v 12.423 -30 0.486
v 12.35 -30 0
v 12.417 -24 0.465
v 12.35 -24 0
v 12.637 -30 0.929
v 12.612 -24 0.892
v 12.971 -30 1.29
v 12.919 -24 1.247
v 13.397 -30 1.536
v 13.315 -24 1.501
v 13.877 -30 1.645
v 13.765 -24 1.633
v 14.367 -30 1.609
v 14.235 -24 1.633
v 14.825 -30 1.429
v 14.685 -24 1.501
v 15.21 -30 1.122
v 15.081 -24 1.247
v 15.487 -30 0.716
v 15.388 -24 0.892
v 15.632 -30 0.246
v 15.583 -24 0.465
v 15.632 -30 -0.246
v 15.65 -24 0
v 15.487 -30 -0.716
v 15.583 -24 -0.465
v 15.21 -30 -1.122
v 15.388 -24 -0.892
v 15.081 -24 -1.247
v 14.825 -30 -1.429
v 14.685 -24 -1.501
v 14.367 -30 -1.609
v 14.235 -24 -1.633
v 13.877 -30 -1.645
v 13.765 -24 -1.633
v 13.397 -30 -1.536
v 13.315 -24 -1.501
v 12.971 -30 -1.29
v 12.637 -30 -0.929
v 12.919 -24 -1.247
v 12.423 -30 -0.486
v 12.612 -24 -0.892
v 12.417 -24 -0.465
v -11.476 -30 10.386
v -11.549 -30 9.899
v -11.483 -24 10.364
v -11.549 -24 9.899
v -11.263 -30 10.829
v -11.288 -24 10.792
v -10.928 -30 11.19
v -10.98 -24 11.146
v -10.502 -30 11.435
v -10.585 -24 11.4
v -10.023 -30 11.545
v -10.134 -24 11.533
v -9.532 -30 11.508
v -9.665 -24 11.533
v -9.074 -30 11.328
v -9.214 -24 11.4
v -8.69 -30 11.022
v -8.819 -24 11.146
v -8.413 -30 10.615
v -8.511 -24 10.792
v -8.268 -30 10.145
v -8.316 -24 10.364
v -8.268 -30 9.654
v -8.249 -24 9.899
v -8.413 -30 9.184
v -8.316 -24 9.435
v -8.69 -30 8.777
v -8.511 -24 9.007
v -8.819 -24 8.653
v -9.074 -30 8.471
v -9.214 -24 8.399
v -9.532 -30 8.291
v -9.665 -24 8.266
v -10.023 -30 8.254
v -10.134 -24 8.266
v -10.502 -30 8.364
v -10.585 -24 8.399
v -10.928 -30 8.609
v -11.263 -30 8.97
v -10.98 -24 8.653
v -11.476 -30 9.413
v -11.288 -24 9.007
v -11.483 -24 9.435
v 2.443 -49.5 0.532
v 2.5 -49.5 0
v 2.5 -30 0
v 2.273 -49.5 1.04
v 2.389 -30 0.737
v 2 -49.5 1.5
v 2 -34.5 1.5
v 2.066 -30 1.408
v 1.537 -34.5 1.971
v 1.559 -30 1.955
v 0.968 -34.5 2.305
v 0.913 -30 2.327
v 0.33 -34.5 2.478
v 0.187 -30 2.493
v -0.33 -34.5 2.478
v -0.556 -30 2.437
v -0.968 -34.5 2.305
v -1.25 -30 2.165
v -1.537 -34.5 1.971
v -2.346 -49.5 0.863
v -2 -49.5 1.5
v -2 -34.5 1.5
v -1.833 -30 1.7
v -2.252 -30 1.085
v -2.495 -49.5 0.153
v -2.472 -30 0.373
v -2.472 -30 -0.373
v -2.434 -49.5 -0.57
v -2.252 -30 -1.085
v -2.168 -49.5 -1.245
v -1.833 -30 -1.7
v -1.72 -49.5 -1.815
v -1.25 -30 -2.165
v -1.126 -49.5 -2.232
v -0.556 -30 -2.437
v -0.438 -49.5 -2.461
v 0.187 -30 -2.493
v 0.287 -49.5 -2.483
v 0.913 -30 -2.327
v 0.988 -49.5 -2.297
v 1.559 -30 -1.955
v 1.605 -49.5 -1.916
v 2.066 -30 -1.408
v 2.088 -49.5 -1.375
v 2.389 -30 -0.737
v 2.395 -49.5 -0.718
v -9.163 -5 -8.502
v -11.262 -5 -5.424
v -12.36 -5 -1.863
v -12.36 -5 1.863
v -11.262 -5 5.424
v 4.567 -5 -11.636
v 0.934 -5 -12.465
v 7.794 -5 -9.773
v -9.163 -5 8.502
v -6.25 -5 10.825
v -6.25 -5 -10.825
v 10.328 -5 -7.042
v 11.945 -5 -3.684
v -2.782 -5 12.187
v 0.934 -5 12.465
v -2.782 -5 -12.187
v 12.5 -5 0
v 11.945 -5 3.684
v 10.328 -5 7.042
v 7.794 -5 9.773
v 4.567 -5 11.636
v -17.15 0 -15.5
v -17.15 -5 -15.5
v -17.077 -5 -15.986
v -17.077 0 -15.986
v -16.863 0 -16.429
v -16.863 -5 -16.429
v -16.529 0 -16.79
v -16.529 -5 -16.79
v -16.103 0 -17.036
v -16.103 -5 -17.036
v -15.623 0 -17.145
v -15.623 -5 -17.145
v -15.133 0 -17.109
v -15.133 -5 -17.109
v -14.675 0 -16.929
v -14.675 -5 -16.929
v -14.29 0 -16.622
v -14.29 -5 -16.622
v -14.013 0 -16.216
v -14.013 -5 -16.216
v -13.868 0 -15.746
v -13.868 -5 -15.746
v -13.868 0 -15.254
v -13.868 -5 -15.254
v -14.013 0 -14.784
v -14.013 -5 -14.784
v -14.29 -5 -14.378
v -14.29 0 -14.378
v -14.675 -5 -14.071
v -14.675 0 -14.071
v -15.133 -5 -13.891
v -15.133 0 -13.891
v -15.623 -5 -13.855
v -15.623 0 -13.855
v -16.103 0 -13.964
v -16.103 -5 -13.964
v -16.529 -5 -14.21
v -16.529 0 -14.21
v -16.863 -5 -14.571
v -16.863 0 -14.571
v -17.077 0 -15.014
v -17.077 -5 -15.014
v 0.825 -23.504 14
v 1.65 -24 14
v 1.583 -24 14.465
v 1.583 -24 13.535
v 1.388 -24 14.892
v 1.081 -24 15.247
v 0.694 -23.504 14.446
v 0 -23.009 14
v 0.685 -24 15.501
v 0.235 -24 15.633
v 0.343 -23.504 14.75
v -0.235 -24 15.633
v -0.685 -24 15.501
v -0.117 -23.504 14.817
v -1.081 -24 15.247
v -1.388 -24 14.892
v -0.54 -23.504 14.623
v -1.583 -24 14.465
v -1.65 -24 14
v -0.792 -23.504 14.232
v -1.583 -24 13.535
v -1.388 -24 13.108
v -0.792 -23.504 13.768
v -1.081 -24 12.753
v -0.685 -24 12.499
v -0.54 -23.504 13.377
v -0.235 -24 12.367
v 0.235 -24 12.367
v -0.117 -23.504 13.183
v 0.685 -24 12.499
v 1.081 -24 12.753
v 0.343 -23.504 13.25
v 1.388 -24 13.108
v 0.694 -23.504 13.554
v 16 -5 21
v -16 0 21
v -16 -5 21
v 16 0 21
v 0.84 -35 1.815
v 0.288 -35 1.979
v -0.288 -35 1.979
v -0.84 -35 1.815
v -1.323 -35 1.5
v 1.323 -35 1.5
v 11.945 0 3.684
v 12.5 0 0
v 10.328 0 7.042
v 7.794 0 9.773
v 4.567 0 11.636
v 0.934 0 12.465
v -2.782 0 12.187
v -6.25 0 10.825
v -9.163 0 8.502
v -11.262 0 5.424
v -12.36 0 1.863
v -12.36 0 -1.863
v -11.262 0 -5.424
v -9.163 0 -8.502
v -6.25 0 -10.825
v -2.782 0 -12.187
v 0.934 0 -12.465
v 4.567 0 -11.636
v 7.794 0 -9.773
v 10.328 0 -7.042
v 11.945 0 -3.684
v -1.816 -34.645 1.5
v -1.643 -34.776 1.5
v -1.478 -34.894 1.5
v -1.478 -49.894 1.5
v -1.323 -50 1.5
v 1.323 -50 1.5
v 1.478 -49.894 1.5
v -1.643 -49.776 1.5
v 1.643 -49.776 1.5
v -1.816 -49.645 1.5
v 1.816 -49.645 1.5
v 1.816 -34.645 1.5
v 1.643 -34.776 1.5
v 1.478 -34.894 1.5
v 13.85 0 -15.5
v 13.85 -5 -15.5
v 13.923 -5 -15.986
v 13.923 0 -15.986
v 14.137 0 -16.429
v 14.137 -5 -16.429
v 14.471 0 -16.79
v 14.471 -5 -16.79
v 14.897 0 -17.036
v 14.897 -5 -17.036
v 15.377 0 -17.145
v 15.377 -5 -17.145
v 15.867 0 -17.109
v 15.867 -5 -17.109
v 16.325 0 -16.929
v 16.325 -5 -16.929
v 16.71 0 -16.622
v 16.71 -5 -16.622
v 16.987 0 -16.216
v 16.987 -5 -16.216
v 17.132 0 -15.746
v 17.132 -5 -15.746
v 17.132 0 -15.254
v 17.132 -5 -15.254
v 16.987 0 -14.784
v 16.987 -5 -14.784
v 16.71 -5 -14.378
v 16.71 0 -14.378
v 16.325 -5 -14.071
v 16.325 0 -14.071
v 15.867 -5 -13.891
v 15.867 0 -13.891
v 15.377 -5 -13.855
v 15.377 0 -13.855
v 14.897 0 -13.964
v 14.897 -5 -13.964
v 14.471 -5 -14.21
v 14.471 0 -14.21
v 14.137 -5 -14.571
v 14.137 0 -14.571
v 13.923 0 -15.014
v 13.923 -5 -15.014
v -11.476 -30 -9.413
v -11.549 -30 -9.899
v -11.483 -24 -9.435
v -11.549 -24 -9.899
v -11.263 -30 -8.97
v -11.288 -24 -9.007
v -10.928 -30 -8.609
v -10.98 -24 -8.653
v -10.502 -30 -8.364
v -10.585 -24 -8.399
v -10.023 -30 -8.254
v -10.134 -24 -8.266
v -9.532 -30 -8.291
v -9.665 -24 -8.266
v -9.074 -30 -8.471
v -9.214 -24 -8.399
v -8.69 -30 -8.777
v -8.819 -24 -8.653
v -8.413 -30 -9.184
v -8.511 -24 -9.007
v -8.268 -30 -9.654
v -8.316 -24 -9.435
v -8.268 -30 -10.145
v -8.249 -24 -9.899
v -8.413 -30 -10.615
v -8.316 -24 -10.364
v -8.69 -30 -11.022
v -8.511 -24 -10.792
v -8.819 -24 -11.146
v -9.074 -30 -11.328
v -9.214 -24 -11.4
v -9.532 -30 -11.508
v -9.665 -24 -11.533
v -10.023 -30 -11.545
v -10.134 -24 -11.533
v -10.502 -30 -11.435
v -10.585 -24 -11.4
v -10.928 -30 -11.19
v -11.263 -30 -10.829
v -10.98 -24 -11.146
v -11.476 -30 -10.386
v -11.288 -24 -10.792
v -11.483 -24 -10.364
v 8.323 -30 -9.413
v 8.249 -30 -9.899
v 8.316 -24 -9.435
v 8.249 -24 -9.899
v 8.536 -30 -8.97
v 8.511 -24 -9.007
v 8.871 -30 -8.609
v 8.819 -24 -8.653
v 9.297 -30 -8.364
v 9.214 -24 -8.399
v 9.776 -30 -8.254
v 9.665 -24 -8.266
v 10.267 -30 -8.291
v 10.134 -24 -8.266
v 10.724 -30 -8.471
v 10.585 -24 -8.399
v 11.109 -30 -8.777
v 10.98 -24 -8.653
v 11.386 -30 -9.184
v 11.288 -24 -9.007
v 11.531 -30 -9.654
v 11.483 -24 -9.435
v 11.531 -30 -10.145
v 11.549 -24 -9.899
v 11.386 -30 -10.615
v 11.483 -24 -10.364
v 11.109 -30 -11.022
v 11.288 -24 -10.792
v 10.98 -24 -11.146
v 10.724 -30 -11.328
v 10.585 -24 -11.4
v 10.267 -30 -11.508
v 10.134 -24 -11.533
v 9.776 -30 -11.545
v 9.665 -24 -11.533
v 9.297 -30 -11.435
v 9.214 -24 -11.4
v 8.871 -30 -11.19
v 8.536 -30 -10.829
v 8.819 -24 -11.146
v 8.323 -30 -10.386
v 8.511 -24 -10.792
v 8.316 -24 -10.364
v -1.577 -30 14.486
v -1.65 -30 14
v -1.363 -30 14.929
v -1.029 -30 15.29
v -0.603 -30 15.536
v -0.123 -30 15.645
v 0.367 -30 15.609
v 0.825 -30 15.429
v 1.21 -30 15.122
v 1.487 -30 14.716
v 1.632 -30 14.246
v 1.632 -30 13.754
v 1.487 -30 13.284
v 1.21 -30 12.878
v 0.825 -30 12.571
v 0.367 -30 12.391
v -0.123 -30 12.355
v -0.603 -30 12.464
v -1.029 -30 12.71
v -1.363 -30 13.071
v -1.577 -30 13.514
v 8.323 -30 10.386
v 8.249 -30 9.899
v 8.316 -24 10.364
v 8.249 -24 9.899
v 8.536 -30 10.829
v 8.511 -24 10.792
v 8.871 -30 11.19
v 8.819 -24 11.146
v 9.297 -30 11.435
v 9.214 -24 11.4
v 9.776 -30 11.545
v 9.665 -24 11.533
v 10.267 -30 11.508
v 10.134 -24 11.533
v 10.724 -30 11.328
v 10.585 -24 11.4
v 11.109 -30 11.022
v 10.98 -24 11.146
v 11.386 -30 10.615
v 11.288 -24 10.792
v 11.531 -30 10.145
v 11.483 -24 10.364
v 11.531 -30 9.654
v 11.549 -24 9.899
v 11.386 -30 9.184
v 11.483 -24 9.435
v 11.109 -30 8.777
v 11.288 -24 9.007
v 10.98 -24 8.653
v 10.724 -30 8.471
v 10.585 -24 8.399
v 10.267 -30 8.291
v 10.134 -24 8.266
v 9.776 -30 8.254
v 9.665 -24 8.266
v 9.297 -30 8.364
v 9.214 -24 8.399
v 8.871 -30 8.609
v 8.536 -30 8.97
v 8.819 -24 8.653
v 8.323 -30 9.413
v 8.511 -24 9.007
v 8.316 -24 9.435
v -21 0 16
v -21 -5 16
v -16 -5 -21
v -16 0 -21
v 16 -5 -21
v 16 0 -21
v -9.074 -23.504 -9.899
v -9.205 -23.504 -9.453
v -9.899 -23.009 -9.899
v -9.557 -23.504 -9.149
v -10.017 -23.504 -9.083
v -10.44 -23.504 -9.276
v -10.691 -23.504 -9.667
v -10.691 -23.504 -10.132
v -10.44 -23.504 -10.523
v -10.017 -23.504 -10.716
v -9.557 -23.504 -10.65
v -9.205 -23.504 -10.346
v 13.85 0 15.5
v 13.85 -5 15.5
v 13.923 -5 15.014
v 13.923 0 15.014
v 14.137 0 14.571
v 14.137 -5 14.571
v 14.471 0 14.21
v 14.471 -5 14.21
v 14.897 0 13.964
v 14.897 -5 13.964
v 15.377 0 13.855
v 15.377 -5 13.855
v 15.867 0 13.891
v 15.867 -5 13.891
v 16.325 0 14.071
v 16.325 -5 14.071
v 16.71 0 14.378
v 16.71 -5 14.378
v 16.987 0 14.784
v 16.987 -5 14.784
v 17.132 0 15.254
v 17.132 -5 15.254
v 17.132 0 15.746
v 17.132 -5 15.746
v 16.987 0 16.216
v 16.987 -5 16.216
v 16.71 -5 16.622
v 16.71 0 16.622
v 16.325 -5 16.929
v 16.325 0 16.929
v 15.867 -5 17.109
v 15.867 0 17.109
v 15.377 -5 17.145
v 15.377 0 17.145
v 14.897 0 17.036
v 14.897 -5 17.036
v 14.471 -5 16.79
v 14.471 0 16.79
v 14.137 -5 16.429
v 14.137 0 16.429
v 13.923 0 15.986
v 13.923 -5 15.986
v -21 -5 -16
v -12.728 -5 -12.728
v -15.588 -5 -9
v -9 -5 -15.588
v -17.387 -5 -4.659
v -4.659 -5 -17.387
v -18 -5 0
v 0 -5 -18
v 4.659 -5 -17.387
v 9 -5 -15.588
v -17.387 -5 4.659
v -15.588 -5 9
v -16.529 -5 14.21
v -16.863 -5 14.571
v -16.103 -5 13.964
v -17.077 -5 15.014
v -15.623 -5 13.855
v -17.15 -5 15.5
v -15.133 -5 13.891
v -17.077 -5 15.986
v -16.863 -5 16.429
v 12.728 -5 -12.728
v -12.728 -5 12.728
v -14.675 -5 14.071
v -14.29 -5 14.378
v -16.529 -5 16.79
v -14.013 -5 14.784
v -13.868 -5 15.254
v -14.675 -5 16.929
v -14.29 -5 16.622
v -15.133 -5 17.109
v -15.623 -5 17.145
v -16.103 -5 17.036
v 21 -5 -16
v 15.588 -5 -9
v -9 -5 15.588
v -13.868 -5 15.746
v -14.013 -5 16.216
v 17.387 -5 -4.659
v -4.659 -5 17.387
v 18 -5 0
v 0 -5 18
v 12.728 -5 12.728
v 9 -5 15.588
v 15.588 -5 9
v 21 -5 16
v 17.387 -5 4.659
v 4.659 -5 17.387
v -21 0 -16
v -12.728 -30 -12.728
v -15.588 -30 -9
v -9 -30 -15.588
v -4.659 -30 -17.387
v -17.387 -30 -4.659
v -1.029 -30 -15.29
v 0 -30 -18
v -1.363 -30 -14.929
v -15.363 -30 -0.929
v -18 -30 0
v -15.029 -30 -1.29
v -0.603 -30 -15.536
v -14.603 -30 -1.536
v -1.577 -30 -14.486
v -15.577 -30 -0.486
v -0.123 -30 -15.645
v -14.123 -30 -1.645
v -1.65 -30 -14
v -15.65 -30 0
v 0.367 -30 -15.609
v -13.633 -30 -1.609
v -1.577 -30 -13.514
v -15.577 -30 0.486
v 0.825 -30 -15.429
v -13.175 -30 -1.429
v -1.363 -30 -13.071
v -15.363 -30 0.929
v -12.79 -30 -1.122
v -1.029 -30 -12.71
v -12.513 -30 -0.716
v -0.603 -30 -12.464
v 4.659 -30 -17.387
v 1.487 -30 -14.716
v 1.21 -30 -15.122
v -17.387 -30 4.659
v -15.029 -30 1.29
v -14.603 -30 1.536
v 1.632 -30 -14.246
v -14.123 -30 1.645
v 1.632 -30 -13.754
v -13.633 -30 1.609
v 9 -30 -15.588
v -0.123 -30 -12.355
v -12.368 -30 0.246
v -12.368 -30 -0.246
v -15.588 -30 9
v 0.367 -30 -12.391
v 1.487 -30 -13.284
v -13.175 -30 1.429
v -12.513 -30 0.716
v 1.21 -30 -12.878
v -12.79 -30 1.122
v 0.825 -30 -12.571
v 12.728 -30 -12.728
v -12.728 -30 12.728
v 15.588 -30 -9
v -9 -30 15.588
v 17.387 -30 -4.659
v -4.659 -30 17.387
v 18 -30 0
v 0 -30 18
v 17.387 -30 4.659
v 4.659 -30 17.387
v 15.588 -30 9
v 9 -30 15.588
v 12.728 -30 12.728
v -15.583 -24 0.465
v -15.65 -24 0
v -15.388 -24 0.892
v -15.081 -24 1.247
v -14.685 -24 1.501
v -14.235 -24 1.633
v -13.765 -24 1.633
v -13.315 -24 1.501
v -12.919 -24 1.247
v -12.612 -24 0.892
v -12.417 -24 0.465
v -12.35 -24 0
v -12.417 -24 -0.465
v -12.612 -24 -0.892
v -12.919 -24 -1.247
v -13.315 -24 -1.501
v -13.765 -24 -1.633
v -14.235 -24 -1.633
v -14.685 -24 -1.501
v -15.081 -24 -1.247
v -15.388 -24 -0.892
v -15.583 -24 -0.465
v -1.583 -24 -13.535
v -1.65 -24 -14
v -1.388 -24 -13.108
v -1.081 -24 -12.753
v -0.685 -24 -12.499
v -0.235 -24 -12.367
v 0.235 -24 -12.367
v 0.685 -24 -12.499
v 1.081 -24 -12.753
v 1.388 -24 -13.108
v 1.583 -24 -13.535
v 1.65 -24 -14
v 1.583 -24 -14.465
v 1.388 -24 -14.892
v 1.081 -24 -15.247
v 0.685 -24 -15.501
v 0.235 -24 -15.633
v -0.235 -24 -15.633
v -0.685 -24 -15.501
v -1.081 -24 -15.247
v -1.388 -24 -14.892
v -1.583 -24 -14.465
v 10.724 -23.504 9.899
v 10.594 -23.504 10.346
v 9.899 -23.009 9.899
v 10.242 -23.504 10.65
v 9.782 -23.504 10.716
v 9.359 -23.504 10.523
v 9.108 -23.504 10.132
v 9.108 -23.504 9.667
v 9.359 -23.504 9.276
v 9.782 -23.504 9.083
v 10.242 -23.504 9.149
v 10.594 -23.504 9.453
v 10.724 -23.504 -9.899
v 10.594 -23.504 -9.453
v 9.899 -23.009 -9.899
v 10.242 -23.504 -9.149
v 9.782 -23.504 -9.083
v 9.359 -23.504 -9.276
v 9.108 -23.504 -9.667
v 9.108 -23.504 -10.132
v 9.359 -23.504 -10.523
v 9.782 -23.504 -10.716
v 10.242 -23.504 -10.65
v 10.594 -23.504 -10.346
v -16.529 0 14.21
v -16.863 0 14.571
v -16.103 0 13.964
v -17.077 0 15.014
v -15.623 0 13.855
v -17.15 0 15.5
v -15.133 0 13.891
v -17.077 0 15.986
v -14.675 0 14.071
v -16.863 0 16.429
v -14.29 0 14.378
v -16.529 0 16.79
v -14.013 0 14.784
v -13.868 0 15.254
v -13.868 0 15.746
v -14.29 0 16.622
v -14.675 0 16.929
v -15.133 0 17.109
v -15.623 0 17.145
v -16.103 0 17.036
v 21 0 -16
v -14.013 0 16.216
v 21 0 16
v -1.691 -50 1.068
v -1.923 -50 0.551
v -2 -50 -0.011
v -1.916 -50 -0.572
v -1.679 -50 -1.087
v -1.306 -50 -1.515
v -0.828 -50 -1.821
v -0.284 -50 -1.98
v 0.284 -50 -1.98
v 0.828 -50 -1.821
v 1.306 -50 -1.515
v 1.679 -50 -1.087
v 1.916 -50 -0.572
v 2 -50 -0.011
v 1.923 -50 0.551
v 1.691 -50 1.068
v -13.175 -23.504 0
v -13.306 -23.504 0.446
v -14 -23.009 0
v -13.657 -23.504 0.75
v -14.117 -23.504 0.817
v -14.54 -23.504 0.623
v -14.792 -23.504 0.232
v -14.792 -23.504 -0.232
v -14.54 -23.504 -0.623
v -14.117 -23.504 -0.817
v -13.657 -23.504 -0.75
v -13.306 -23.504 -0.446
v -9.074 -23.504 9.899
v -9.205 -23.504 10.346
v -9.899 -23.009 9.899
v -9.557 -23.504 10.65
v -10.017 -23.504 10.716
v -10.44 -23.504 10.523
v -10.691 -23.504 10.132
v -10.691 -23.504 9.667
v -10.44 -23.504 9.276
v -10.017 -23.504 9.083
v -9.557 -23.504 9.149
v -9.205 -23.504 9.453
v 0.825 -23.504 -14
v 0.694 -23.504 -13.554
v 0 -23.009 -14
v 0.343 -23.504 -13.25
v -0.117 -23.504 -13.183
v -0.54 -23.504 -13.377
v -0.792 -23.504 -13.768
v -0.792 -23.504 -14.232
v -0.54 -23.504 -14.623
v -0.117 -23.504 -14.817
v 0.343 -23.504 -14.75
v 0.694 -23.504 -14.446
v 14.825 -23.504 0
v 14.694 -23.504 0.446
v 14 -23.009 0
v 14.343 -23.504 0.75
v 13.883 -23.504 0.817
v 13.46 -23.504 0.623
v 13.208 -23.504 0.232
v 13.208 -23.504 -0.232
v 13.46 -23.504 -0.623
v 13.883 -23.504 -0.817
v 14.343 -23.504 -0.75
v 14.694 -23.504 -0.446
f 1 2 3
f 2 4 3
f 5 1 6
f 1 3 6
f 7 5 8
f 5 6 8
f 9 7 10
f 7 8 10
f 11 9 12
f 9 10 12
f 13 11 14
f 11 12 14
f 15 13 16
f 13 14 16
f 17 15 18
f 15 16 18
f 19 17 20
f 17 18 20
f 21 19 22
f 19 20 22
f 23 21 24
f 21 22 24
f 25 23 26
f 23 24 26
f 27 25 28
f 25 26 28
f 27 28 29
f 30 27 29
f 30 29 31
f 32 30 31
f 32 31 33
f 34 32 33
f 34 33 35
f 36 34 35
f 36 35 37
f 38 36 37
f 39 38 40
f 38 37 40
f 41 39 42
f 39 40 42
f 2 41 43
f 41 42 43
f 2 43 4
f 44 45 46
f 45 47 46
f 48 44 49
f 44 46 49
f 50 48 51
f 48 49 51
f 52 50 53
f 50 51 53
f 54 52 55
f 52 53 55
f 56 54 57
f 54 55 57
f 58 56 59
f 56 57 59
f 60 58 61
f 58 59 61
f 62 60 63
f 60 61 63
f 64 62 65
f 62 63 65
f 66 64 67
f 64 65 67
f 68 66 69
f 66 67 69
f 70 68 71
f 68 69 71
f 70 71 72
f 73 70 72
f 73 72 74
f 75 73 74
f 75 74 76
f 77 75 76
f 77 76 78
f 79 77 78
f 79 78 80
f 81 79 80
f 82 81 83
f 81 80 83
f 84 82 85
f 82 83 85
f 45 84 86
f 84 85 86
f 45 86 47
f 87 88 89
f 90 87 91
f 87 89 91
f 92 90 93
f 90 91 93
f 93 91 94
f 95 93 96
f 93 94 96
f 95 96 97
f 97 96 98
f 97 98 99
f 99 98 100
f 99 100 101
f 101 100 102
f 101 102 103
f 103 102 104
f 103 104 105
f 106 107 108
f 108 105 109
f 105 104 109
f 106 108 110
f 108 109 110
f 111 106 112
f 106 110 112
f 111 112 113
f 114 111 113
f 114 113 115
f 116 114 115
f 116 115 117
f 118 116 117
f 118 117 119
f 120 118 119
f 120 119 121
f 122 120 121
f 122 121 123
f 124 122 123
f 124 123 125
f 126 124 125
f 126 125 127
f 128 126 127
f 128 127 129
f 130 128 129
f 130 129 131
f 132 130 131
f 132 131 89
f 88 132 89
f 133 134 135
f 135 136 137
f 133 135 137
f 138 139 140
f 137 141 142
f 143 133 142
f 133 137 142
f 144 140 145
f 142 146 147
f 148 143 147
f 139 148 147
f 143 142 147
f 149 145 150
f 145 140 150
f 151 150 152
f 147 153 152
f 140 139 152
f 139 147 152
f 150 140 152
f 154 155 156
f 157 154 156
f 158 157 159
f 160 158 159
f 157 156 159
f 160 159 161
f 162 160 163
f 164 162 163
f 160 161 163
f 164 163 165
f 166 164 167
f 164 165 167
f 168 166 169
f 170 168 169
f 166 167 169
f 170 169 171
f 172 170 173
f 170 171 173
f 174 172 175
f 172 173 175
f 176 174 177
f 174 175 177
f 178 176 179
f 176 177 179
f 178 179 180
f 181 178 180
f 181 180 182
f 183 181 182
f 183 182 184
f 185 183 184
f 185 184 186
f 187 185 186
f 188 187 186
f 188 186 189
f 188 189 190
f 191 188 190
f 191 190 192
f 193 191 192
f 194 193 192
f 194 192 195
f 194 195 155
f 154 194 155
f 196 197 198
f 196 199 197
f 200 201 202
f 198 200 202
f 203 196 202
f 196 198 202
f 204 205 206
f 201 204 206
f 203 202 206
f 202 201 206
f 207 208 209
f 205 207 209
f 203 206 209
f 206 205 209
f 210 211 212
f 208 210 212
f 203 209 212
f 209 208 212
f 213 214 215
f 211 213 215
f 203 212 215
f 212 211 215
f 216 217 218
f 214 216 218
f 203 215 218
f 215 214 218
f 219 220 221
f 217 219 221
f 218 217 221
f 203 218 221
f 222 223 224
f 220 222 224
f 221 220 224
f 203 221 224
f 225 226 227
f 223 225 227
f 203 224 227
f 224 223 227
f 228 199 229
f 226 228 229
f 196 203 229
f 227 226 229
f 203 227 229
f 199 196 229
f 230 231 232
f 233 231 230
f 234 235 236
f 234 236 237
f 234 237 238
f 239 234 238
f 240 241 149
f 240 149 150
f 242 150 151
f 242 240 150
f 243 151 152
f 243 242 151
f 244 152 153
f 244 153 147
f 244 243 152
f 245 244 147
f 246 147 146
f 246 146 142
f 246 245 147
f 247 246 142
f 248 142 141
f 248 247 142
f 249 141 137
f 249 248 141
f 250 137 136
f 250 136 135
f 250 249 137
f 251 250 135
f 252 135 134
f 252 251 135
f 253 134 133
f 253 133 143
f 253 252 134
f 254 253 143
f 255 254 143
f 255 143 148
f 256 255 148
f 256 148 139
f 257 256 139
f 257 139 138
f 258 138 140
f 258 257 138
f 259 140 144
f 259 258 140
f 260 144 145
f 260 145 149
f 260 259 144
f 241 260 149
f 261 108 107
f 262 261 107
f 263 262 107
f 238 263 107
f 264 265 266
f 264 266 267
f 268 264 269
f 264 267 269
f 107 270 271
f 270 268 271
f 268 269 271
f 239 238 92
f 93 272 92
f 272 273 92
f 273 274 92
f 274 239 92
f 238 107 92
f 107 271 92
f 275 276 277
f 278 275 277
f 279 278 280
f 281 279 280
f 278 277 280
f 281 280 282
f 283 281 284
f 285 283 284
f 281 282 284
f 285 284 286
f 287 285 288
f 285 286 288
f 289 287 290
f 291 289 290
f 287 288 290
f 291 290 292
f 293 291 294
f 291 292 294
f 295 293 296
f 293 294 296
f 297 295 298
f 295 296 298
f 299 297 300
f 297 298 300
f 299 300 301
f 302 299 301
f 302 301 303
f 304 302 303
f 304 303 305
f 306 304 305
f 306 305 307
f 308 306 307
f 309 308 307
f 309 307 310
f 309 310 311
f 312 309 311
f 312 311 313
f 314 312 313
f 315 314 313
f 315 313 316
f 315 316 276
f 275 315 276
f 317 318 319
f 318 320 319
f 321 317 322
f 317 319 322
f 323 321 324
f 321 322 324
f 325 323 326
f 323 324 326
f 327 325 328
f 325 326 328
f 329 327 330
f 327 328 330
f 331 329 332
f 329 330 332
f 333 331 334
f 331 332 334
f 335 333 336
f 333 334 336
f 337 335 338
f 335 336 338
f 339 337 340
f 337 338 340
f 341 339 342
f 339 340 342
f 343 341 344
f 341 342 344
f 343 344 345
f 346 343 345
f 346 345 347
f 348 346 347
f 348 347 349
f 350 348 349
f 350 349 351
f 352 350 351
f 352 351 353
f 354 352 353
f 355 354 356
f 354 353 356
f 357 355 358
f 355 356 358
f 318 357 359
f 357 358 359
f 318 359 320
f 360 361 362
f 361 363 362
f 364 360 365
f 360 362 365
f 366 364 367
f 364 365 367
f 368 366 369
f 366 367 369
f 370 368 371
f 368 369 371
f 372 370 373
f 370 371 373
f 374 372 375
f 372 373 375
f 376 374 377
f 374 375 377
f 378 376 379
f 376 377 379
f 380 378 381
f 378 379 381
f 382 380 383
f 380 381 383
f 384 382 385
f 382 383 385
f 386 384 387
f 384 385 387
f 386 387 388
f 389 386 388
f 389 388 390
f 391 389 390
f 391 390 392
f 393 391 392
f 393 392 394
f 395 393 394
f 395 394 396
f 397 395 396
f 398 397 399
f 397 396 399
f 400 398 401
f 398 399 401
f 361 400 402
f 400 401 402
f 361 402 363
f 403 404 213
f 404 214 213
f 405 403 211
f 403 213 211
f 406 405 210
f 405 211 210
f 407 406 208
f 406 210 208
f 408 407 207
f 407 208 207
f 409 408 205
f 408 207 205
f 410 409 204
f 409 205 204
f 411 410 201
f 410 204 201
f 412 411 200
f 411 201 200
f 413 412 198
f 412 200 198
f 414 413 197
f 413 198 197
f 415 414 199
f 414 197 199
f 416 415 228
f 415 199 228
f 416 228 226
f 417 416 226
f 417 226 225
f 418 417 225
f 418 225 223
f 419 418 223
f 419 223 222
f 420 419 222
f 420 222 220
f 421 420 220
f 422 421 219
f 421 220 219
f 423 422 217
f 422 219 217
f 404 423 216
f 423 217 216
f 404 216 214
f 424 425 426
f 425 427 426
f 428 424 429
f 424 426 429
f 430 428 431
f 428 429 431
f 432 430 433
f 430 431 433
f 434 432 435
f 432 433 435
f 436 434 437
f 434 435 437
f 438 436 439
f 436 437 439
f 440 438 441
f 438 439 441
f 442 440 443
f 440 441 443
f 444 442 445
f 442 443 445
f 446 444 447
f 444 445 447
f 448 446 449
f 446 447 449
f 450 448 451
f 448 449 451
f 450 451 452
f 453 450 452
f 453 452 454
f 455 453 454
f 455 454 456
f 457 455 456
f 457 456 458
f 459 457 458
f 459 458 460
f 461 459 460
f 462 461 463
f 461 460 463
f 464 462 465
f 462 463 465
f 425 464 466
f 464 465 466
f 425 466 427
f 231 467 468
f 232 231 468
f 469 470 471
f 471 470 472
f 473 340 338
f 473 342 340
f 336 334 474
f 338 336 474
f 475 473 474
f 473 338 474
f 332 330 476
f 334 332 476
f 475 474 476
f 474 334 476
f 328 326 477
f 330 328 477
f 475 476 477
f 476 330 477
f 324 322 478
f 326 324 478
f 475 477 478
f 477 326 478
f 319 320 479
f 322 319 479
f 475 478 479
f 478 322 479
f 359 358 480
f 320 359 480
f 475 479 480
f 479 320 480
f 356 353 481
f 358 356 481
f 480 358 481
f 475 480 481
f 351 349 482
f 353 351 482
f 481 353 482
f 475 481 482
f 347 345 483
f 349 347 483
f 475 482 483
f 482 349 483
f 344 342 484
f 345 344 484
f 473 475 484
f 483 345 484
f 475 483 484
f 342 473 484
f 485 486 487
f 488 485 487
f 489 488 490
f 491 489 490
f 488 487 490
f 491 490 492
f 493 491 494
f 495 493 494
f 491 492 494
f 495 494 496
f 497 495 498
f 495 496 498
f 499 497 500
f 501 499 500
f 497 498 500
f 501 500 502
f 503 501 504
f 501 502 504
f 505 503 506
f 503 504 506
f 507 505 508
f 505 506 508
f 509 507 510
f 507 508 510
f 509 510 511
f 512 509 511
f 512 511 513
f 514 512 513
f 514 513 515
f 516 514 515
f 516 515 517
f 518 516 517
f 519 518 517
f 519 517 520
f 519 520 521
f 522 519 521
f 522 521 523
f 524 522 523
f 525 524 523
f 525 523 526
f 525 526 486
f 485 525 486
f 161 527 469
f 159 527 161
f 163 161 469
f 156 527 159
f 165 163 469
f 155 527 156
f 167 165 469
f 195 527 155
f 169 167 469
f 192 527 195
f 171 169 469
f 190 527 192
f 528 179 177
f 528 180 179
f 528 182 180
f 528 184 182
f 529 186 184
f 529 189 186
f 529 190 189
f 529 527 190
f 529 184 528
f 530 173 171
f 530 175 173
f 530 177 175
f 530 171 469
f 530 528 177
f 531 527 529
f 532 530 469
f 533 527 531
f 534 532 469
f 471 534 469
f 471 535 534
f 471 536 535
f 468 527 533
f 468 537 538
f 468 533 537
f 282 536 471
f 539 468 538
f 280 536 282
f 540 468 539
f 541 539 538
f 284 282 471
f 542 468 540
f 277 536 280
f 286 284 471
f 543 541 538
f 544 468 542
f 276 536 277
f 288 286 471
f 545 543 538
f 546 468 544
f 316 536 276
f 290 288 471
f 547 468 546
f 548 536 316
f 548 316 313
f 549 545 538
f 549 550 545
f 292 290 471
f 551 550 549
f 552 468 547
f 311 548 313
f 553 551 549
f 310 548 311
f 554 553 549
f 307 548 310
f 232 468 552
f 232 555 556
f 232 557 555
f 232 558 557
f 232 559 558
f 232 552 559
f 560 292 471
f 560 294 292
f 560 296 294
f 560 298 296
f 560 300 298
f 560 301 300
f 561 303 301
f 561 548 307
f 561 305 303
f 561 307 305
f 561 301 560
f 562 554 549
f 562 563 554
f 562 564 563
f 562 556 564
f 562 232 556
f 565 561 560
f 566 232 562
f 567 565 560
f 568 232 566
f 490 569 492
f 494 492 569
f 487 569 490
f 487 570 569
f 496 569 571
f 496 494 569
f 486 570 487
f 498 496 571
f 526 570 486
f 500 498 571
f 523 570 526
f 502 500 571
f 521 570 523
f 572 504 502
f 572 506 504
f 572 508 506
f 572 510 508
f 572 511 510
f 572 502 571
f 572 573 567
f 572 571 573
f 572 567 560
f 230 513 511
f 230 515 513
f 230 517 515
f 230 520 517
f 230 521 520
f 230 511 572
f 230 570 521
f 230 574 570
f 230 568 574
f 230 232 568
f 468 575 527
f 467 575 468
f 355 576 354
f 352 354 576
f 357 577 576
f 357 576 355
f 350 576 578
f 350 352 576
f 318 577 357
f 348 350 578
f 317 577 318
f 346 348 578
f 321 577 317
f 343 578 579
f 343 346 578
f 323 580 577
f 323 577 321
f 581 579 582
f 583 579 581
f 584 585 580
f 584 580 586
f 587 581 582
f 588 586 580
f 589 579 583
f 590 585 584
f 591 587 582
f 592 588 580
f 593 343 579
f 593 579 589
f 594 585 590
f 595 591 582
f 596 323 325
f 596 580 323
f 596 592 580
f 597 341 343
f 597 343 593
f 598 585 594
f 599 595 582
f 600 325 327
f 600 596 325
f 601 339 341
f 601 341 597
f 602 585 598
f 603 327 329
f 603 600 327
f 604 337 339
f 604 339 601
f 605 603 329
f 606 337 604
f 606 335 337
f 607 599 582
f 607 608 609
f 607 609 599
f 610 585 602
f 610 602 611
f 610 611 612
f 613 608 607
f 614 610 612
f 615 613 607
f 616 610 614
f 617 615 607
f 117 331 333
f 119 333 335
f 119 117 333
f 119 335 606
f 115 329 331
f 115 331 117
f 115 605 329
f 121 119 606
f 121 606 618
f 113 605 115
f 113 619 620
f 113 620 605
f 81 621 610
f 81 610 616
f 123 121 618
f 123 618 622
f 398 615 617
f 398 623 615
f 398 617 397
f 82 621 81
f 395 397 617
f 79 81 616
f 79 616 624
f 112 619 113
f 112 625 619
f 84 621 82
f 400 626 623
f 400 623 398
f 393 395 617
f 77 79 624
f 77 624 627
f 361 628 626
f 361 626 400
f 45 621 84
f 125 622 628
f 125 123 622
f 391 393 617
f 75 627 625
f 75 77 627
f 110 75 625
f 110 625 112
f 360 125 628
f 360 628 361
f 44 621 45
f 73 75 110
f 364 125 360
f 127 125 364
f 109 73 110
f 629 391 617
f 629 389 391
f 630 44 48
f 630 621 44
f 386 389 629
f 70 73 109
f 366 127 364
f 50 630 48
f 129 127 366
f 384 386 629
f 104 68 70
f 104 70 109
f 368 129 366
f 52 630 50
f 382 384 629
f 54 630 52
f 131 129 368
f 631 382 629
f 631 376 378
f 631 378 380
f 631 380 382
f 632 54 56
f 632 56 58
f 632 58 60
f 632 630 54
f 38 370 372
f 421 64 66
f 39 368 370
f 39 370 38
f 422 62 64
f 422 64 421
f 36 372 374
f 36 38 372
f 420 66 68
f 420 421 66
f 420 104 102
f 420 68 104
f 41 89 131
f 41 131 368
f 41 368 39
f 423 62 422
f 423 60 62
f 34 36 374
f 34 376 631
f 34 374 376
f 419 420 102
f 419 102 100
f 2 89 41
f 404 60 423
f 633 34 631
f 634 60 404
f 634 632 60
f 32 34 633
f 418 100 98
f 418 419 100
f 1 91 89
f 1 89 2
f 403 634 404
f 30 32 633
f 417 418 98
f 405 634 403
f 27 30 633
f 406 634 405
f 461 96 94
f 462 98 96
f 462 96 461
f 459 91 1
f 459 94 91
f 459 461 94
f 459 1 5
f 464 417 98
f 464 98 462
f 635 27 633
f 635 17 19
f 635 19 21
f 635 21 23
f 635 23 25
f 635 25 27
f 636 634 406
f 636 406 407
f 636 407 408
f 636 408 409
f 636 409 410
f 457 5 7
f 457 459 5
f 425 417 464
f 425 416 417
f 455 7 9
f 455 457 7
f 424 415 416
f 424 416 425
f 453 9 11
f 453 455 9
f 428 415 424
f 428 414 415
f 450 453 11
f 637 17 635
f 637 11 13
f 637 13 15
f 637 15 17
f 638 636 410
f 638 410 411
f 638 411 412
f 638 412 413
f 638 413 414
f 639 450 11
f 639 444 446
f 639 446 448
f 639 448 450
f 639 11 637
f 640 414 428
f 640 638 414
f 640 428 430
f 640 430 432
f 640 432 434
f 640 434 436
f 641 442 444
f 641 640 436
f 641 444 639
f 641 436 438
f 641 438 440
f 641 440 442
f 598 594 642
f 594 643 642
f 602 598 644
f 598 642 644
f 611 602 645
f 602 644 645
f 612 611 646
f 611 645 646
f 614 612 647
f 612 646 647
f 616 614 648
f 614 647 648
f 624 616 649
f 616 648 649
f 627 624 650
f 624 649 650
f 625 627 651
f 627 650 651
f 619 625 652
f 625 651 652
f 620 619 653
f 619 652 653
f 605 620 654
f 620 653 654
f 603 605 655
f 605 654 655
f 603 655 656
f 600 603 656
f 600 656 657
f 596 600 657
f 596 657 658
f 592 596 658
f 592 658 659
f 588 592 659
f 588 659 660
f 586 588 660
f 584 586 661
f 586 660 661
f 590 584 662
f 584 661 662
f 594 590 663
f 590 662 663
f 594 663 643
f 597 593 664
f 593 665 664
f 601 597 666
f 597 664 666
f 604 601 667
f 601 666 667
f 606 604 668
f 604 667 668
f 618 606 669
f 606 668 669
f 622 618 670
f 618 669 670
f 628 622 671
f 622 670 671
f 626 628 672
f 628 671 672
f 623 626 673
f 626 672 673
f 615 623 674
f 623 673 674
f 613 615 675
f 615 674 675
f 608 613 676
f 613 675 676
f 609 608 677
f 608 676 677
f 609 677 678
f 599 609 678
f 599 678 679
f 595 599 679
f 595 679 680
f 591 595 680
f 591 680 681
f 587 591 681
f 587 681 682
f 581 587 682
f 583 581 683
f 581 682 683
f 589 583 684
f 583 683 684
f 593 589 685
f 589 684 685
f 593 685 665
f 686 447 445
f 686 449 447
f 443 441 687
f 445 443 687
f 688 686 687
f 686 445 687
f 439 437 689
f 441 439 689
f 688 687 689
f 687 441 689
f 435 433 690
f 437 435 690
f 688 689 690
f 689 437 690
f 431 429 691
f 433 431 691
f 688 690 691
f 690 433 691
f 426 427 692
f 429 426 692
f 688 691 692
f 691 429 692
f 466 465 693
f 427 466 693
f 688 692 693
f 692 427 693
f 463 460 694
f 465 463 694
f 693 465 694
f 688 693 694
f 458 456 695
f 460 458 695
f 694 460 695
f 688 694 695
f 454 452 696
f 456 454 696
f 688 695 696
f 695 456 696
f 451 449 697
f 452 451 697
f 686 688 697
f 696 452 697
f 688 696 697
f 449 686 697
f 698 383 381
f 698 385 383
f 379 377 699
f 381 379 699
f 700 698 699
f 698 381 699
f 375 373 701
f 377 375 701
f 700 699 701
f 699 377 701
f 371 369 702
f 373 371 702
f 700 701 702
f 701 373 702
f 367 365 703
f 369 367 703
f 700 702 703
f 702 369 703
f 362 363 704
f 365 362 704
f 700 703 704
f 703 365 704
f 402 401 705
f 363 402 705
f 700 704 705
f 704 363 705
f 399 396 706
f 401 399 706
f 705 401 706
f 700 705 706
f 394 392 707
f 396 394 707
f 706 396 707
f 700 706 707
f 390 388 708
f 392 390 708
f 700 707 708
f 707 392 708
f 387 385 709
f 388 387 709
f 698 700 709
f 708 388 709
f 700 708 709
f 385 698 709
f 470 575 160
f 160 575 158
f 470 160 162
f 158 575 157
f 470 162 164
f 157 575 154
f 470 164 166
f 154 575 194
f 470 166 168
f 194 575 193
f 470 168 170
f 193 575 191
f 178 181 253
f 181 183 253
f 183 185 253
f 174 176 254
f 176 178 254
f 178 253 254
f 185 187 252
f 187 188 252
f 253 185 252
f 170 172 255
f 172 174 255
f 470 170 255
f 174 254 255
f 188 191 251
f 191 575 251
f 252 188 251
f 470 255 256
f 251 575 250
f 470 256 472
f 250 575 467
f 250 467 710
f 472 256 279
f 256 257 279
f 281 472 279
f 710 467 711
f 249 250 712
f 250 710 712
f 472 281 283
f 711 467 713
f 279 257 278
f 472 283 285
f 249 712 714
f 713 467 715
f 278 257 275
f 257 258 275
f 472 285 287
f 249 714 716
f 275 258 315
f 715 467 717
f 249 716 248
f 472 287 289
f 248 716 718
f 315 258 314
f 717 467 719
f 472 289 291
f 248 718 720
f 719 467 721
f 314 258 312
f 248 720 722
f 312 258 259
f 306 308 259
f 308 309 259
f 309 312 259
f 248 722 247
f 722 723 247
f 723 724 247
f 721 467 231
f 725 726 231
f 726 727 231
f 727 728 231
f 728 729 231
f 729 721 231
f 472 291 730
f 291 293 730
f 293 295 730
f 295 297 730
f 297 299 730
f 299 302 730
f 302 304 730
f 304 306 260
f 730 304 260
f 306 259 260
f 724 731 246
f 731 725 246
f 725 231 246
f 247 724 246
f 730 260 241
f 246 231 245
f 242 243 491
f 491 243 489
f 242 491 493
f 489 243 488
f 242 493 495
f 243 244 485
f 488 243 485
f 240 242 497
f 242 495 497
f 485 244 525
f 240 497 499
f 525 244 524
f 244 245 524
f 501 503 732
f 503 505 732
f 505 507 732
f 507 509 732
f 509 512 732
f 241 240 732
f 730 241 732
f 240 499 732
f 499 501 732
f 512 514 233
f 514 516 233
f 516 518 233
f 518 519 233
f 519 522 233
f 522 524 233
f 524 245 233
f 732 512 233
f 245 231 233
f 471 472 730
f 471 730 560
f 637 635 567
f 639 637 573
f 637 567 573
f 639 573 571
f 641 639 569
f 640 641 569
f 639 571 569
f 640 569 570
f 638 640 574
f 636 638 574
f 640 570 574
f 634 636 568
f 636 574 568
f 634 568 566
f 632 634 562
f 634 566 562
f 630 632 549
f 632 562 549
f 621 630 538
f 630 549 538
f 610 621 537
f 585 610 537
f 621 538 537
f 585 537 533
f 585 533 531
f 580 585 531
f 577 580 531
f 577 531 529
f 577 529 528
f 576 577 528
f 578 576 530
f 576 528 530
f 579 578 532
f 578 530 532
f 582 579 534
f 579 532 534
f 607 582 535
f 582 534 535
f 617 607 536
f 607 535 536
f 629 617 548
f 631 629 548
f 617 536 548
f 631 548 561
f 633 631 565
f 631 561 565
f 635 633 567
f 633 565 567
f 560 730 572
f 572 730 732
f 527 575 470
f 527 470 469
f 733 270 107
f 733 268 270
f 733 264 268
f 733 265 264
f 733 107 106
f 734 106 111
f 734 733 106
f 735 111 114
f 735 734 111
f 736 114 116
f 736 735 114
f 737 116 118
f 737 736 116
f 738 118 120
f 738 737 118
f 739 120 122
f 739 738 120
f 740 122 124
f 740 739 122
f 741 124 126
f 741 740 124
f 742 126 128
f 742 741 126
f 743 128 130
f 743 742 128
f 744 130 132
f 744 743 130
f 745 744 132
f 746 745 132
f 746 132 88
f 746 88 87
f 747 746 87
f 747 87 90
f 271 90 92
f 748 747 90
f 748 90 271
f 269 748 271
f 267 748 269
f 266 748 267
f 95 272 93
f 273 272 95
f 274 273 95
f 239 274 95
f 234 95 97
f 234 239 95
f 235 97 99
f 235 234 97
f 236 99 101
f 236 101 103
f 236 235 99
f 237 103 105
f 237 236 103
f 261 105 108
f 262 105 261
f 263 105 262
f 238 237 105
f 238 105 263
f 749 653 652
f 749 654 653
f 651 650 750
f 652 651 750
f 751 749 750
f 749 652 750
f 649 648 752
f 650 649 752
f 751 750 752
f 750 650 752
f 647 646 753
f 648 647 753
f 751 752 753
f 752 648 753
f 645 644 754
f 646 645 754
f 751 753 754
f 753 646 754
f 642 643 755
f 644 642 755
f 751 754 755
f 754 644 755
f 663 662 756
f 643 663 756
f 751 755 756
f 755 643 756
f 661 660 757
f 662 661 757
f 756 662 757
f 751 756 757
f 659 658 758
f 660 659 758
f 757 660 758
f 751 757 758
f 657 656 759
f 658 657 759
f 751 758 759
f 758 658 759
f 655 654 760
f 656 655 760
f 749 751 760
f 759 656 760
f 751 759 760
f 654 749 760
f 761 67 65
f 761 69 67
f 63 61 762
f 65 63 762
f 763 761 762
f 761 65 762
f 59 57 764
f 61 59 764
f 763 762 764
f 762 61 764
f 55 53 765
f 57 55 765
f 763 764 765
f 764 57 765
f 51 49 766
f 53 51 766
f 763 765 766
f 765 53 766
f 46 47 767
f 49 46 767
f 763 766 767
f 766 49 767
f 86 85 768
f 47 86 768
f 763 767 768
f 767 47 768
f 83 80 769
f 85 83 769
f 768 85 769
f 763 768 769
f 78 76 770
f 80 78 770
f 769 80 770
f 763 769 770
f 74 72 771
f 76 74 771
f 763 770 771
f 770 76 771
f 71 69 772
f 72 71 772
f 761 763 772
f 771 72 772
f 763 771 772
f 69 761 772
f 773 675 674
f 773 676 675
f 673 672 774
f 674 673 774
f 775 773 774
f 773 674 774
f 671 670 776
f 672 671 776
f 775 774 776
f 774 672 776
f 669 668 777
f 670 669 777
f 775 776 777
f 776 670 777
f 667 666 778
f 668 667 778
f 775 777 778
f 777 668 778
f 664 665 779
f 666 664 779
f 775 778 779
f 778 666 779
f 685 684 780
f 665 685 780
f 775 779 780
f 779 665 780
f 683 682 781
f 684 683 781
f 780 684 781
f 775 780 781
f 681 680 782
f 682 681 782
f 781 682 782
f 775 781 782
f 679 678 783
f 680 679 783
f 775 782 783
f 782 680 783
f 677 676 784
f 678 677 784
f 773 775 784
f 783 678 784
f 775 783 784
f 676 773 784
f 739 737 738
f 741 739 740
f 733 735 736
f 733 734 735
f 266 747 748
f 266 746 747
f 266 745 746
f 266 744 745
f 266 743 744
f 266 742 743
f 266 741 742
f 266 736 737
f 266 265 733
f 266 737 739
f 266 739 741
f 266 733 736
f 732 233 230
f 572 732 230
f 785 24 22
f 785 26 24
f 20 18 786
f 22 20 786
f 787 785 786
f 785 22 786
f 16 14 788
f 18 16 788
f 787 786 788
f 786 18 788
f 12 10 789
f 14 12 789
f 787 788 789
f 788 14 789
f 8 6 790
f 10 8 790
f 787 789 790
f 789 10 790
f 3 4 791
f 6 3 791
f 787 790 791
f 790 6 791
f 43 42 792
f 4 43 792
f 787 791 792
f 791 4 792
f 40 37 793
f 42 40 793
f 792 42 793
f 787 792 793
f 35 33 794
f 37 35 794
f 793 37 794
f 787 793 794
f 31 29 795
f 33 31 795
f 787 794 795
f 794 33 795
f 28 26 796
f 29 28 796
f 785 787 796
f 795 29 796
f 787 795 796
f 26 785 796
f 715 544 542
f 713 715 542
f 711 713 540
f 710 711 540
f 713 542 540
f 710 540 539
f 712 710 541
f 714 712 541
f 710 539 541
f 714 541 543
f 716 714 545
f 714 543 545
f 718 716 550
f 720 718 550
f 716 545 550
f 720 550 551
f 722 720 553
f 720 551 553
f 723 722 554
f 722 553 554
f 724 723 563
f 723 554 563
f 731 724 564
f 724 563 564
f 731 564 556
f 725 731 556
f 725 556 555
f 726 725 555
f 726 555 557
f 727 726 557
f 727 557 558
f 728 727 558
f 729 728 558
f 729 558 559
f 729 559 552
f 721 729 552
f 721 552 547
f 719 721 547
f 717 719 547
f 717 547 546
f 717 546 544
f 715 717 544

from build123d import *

# Parameters (mm, degrees)
F0_W     = 42
F0_H     = 42
F0_R     = 12.5
F1_DEPTH = 5
F2_R     = 18
F2_R_2   = 12.5
F3_DEPTH = 25
F4_R     = 2.5
F5_DEPTH = 20
F7_DEPTH = 15
F8_D     = 3.3
F9_D     = 3.3
F9_DEPTH = 6
F9_TIP   = 0.9914200214
F10_SIZE = 5
F11_SIZE = 0.5


with BuildPart() as f1:
    # F0 (on Front) → F1 (new body)
    with BuildSketch(Plane.XZ):
        Rectangle(F0_W, F0_H)
        Circle(F0_R, mode=Mode.SUBTRACT)
    extrude(amount=F1_DEPTH)

    # F2 (on face) → F3 (join)
    with BuildSketch(Plane.XZ.offset(5)):
        Circle(F2_R)
        Circle(F2_R_2, mode=Mode.SUBTRACT)
        Circle(F2_R_2)
    extrude(amount=F3_DEPTH)

    # F4 (on face) → F5 (join)
    with BuildSketch(Plane.XZ.offset(30)):
        Circle(F4_R)
    extrude(amount=F5_DEPTH)

    # F6 (on face) → F7 (cut)
    with BuildSketch(Plane.XZ.offset(50)):
        with BuildLine():
            Line((-2, 1.5), (2, 1.5))
            ThreePointArc((2, 1.5), (0, 2.5), (-2, 1.5))
        make_face()
    extrude(amount=-F7_DEPTH, mode=Mode.SUBTRACT)

    # F8 (through all)
    with Locations(Plane(origin=(0, 0, 0), x_dir=(1, 0, 0), z_dir=(0, 1, 0))):
        with Locations((-15.5, -15.5), (15.5, -15.5), (-15.5, 15.5), (15.5, 15.5)):
            Hole(F8_D / 2)

    # F9
    with Locations(Plane.XZ.offset(30)):
        with Locations((0, 14), (-14, 0), (0, -14), (14, 0), (-9.8994949366, 9.8994949366), (-9.8994949366, -9.8994949366), (9.8994949366, -9.8994949366), (9.8994949366, 9.8994949366)):
            Hole(F9_D / 2, depth=F9_DEPTH)
            with Locations((0, 0, -(F9_DEPTH + F9_TIP / 2))):  # 118° drill point
                Cone(0, F9_D / 2, F9_TIP, mode=Mode.SUBTRACT)

    # F10
    f10_edges = [f1.edges().sort_by_distance(p)[0] for p in [
        (-21, -2.5, 21),
        (21, -2.5, 21),
        (-21, -2.5, -21),
        (21, -2.5, -21),
    ]]
    chamfer(f10_edges, length=F10_SIZE)

    # F11
    f11_edges = [f1.edges().sort_by_distance(p)[0] for p in [
        (-0.790569, -50, -2.371708),
        (0, -35, 2.5),
    ]]
    chamfer(f11_edges, length=F11_SIZE)


solid = f1.part
